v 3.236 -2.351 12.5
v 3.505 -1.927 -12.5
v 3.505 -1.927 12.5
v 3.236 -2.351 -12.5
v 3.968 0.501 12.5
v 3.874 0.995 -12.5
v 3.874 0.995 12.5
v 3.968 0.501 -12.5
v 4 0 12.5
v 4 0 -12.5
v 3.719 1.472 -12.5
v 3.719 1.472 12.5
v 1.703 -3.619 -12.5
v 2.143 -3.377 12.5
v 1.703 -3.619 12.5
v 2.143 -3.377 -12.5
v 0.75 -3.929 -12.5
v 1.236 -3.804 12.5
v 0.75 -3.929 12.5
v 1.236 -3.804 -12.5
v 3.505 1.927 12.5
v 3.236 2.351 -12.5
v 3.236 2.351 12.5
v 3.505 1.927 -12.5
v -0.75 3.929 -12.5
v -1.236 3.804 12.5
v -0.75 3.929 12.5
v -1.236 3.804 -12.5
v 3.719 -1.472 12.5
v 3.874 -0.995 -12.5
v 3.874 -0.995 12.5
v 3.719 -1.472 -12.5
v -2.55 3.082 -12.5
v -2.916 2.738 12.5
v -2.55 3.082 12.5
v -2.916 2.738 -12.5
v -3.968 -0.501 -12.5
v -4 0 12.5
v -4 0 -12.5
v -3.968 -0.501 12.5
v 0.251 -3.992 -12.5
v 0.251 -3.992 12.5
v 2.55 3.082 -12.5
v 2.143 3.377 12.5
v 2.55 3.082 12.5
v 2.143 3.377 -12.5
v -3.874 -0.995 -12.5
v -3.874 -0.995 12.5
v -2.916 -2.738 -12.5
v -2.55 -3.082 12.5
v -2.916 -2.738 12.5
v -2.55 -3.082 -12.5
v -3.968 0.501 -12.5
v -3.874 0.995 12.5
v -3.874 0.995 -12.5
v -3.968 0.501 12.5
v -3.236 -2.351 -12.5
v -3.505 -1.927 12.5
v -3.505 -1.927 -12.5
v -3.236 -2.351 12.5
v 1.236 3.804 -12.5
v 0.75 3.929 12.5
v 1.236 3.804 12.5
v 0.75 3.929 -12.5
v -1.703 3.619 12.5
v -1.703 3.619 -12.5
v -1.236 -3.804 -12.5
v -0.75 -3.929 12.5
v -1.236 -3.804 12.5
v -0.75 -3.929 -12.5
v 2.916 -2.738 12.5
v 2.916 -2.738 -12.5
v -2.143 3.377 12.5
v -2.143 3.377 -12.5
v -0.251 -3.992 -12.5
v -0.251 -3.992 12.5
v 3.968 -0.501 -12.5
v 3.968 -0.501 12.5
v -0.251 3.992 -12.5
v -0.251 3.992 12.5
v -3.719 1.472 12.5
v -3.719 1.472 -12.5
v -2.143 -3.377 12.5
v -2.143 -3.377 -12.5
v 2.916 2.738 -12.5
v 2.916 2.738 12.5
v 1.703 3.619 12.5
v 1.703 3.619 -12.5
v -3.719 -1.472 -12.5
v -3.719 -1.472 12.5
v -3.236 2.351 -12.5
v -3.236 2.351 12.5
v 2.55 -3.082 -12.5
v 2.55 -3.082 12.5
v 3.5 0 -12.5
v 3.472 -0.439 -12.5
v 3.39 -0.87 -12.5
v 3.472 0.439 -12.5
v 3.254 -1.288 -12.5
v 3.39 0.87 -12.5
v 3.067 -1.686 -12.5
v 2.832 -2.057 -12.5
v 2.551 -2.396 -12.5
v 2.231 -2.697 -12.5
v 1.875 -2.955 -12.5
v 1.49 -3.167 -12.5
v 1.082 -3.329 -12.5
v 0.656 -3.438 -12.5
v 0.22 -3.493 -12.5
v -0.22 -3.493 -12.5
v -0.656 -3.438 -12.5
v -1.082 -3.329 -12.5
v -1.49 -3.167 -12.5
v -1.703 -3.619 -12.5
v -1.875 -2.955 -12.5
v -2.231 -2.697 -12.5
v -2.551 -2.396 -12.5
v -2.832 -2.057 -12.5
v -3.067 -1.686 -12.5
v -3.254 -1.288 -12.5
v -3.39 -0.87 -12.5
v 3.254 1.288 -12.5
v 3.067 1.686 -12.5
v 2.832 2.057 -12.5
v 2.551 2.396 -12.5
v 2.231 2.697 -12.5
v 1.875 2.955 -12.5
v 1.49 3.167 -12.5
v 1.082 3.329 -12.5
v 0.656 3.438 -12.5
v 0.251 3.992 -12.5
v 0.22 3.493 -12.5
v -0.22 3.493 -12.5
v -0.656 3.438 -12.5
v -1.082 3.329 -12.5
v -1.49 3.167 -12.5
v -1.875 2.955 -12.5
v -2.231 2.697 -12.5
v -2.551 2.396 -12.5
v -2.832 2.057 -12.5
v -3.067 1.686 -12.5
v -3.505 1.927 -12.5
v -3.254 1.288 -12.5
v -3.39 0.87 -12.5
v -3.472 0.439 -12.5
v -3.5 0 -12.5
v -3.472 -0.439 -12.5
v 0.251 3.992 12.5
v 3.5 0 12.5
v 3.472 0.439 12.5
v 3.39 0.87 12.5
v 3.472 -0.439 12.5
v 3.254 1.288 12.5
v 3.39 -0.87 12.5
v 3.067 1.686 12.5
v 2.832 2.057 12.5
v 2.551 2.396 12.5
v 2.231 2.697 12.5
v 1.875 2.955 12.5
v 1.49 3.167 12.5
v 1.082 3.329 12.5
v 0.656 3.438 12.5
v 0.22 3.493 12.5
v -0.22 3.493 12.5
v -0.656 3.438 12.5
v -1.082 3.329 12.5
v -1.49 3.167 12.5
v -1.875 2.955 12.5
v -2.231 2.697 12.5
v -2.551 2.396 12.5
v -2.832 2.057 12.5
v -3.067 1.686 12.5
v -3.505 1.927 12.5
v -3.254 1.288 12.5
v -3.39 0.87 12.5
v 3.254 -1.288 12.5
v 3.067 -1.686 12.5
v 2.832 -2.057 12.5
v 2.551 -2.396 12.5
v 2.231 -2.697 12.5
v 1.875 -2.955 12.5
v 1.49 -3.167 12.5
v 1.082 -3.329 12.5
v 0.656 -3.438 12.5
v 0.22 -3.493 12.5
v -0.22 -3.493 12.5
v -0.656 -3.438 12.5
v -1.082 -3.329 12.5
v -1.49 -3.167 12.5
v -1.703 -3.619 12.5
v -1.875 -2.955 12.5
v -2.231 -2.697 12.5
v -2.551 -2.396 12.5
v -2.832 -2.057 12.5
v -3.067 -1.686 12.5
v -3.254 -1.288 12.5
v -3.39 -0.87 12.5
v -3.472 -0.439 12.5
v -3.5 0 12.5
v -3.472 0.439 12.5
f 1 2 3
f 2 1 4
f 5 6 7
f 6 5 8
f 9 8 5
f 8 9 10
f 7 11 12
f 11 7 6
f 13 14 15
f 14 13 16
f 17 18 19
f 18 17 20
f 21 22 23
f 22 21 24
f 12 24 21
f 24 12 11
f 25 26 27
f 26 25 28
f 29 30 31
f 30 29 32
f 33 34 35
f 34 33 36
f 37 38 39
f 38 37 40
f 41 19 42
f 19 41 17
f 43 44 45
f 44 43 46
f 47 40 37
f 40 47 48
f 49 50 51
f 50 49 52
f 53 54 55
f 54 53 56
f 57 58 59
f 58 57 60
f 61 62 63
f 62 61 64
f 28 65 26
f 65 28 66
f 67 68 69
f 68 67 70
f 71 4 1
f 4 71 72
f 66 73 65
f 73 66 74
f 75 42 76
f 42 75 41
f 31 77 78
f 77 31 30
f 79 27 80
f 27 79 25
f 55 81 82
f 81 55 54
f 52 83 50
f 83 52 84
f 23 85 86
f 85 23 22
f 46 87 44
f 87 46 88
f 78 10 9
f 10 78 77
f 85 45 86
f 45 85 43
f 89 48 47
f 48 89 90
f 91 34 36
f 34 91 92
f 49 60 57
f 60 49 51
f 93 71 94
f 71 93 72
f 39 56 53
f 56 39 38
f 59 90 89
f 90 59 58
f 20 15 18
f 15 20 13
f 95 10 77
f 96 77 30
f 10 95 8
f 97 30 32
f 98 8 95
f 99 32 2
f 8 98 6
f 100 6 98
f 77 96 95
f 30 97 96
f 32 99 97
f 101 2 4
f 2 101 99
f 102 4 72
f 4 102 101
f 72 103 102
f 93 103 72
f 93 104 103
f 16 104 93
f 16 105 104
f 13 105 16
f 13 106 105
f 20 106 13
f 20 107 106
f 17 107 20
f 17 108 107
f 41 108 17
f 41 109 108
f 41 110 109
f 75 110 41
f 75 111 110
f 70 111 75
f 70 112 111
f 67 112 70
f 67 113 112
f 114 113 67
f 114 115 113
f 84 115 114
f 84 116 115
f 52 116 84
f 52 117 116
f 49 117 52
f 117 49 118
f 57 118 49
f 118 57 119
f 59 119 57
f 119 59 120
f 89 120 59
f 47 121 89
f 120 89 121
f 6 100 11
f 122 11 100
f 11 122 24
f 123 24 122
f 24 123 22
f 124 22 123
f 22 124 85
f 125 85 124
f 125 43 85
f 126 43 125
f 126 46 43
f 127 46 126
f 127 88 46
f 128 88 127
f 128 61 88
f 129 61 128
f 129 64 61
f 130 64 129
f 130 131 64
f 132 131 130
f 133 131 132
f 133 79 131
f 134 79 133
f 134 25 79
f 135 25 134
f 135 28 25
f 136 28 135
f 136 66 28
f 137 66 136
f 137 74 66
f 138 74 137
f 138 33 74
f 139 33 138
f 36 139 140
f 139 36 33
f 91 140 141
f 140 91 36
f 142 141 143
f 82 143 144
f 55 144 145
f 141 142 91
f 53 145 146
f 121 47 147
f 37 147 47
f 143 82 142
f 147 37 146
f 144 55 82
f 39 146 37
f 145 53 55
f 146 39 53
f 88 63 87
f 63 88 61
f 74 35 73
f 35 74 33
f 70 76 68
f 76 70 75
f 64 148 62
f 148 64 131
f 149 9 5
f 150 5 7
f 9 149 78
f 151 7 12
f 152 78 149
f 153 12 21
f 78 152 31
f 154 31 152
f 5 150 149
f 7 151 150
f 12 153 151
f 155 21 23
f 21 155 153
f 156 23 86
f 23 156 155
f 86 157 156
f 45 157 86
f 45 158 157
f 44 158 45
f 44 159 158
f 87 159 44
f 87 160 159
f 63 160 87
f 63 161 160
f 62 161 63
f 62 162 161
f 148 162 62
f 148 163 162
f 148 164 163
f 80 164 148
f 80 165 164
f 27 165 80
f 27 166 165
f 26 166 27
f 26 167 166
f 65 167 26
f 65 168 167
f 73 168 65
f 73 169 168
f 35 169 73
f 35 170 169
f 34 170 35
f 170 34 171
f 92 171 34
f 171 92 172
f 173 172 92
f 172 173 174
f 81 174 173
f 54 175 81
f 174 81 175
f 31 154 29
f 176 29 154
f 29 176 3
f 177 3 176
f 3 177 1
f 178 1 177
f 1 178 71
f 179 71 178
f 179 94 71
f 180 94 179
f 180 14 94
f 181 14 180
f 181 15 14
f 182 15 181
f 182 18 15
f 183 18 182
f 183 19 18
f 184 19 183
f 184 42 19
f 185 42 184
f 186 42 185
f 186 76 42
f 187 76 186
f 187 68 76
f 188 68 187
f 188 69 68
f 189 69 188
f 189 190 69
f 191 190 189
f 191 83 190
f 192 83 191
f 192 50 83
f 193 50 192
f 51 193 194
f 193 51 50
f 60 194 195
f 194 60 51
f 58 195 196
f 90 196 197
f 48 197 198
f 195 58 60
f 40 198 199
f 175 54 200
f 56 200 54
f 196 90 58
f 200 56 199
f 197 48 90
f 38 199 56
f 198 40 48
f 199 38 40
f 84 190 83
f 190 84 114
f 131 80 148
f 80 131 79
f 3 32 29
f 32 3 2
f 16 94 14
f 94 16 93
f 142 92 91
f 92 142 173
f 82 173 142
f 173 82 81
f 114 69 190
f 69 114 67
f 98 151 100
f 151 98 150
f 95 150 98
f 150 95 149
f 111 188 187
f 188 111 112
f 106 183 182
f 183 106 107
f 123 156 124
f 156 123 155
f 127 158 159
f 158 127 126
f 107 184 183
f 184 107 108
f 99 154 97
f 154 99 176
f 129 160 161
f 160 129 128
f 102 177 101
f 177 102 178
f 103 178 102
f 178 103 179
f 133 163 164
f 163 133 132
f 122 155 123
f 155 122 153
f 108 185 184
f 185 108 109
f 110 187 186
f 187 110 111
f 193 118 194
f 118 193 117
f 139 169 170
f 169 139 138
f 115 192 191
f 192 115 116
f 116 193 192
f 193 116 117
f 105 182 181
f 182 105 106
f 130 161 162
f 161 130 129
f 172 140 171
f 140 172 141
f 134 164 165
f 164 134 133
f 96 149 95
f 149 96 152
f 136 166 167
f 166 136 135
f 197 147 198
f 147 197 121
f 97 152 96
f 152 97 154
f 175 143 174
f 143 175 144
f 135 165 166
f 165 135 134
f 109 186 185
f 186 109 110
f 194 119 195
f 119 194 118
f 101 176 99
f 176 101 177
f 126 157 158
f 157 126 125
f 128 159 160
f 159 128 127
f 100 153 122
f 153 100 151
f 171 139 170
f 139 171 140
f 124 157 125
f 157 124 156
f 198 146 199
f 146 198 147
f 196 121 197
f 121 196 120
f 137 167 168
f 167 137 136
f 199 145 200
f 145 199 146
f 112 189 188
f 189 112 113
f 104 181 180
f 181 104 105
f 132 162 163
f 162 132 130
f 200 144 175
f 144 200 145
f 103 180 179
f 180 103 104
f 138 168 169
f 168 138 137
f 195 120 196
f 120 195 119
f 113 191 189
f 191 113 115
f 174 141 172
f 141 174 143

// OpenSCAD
$fn = 50;


difference() {
	union() {
		translate(v = [0, 0, -12.5000000000]) {
			cylinder(h = 25, r = 4.0000000000);
		}
	}
	union() {
		translate(v = [0, 0, -100.0000000000]) {
			cylinder(h = 200, r = 3.5000000000);
		}
	}
}
